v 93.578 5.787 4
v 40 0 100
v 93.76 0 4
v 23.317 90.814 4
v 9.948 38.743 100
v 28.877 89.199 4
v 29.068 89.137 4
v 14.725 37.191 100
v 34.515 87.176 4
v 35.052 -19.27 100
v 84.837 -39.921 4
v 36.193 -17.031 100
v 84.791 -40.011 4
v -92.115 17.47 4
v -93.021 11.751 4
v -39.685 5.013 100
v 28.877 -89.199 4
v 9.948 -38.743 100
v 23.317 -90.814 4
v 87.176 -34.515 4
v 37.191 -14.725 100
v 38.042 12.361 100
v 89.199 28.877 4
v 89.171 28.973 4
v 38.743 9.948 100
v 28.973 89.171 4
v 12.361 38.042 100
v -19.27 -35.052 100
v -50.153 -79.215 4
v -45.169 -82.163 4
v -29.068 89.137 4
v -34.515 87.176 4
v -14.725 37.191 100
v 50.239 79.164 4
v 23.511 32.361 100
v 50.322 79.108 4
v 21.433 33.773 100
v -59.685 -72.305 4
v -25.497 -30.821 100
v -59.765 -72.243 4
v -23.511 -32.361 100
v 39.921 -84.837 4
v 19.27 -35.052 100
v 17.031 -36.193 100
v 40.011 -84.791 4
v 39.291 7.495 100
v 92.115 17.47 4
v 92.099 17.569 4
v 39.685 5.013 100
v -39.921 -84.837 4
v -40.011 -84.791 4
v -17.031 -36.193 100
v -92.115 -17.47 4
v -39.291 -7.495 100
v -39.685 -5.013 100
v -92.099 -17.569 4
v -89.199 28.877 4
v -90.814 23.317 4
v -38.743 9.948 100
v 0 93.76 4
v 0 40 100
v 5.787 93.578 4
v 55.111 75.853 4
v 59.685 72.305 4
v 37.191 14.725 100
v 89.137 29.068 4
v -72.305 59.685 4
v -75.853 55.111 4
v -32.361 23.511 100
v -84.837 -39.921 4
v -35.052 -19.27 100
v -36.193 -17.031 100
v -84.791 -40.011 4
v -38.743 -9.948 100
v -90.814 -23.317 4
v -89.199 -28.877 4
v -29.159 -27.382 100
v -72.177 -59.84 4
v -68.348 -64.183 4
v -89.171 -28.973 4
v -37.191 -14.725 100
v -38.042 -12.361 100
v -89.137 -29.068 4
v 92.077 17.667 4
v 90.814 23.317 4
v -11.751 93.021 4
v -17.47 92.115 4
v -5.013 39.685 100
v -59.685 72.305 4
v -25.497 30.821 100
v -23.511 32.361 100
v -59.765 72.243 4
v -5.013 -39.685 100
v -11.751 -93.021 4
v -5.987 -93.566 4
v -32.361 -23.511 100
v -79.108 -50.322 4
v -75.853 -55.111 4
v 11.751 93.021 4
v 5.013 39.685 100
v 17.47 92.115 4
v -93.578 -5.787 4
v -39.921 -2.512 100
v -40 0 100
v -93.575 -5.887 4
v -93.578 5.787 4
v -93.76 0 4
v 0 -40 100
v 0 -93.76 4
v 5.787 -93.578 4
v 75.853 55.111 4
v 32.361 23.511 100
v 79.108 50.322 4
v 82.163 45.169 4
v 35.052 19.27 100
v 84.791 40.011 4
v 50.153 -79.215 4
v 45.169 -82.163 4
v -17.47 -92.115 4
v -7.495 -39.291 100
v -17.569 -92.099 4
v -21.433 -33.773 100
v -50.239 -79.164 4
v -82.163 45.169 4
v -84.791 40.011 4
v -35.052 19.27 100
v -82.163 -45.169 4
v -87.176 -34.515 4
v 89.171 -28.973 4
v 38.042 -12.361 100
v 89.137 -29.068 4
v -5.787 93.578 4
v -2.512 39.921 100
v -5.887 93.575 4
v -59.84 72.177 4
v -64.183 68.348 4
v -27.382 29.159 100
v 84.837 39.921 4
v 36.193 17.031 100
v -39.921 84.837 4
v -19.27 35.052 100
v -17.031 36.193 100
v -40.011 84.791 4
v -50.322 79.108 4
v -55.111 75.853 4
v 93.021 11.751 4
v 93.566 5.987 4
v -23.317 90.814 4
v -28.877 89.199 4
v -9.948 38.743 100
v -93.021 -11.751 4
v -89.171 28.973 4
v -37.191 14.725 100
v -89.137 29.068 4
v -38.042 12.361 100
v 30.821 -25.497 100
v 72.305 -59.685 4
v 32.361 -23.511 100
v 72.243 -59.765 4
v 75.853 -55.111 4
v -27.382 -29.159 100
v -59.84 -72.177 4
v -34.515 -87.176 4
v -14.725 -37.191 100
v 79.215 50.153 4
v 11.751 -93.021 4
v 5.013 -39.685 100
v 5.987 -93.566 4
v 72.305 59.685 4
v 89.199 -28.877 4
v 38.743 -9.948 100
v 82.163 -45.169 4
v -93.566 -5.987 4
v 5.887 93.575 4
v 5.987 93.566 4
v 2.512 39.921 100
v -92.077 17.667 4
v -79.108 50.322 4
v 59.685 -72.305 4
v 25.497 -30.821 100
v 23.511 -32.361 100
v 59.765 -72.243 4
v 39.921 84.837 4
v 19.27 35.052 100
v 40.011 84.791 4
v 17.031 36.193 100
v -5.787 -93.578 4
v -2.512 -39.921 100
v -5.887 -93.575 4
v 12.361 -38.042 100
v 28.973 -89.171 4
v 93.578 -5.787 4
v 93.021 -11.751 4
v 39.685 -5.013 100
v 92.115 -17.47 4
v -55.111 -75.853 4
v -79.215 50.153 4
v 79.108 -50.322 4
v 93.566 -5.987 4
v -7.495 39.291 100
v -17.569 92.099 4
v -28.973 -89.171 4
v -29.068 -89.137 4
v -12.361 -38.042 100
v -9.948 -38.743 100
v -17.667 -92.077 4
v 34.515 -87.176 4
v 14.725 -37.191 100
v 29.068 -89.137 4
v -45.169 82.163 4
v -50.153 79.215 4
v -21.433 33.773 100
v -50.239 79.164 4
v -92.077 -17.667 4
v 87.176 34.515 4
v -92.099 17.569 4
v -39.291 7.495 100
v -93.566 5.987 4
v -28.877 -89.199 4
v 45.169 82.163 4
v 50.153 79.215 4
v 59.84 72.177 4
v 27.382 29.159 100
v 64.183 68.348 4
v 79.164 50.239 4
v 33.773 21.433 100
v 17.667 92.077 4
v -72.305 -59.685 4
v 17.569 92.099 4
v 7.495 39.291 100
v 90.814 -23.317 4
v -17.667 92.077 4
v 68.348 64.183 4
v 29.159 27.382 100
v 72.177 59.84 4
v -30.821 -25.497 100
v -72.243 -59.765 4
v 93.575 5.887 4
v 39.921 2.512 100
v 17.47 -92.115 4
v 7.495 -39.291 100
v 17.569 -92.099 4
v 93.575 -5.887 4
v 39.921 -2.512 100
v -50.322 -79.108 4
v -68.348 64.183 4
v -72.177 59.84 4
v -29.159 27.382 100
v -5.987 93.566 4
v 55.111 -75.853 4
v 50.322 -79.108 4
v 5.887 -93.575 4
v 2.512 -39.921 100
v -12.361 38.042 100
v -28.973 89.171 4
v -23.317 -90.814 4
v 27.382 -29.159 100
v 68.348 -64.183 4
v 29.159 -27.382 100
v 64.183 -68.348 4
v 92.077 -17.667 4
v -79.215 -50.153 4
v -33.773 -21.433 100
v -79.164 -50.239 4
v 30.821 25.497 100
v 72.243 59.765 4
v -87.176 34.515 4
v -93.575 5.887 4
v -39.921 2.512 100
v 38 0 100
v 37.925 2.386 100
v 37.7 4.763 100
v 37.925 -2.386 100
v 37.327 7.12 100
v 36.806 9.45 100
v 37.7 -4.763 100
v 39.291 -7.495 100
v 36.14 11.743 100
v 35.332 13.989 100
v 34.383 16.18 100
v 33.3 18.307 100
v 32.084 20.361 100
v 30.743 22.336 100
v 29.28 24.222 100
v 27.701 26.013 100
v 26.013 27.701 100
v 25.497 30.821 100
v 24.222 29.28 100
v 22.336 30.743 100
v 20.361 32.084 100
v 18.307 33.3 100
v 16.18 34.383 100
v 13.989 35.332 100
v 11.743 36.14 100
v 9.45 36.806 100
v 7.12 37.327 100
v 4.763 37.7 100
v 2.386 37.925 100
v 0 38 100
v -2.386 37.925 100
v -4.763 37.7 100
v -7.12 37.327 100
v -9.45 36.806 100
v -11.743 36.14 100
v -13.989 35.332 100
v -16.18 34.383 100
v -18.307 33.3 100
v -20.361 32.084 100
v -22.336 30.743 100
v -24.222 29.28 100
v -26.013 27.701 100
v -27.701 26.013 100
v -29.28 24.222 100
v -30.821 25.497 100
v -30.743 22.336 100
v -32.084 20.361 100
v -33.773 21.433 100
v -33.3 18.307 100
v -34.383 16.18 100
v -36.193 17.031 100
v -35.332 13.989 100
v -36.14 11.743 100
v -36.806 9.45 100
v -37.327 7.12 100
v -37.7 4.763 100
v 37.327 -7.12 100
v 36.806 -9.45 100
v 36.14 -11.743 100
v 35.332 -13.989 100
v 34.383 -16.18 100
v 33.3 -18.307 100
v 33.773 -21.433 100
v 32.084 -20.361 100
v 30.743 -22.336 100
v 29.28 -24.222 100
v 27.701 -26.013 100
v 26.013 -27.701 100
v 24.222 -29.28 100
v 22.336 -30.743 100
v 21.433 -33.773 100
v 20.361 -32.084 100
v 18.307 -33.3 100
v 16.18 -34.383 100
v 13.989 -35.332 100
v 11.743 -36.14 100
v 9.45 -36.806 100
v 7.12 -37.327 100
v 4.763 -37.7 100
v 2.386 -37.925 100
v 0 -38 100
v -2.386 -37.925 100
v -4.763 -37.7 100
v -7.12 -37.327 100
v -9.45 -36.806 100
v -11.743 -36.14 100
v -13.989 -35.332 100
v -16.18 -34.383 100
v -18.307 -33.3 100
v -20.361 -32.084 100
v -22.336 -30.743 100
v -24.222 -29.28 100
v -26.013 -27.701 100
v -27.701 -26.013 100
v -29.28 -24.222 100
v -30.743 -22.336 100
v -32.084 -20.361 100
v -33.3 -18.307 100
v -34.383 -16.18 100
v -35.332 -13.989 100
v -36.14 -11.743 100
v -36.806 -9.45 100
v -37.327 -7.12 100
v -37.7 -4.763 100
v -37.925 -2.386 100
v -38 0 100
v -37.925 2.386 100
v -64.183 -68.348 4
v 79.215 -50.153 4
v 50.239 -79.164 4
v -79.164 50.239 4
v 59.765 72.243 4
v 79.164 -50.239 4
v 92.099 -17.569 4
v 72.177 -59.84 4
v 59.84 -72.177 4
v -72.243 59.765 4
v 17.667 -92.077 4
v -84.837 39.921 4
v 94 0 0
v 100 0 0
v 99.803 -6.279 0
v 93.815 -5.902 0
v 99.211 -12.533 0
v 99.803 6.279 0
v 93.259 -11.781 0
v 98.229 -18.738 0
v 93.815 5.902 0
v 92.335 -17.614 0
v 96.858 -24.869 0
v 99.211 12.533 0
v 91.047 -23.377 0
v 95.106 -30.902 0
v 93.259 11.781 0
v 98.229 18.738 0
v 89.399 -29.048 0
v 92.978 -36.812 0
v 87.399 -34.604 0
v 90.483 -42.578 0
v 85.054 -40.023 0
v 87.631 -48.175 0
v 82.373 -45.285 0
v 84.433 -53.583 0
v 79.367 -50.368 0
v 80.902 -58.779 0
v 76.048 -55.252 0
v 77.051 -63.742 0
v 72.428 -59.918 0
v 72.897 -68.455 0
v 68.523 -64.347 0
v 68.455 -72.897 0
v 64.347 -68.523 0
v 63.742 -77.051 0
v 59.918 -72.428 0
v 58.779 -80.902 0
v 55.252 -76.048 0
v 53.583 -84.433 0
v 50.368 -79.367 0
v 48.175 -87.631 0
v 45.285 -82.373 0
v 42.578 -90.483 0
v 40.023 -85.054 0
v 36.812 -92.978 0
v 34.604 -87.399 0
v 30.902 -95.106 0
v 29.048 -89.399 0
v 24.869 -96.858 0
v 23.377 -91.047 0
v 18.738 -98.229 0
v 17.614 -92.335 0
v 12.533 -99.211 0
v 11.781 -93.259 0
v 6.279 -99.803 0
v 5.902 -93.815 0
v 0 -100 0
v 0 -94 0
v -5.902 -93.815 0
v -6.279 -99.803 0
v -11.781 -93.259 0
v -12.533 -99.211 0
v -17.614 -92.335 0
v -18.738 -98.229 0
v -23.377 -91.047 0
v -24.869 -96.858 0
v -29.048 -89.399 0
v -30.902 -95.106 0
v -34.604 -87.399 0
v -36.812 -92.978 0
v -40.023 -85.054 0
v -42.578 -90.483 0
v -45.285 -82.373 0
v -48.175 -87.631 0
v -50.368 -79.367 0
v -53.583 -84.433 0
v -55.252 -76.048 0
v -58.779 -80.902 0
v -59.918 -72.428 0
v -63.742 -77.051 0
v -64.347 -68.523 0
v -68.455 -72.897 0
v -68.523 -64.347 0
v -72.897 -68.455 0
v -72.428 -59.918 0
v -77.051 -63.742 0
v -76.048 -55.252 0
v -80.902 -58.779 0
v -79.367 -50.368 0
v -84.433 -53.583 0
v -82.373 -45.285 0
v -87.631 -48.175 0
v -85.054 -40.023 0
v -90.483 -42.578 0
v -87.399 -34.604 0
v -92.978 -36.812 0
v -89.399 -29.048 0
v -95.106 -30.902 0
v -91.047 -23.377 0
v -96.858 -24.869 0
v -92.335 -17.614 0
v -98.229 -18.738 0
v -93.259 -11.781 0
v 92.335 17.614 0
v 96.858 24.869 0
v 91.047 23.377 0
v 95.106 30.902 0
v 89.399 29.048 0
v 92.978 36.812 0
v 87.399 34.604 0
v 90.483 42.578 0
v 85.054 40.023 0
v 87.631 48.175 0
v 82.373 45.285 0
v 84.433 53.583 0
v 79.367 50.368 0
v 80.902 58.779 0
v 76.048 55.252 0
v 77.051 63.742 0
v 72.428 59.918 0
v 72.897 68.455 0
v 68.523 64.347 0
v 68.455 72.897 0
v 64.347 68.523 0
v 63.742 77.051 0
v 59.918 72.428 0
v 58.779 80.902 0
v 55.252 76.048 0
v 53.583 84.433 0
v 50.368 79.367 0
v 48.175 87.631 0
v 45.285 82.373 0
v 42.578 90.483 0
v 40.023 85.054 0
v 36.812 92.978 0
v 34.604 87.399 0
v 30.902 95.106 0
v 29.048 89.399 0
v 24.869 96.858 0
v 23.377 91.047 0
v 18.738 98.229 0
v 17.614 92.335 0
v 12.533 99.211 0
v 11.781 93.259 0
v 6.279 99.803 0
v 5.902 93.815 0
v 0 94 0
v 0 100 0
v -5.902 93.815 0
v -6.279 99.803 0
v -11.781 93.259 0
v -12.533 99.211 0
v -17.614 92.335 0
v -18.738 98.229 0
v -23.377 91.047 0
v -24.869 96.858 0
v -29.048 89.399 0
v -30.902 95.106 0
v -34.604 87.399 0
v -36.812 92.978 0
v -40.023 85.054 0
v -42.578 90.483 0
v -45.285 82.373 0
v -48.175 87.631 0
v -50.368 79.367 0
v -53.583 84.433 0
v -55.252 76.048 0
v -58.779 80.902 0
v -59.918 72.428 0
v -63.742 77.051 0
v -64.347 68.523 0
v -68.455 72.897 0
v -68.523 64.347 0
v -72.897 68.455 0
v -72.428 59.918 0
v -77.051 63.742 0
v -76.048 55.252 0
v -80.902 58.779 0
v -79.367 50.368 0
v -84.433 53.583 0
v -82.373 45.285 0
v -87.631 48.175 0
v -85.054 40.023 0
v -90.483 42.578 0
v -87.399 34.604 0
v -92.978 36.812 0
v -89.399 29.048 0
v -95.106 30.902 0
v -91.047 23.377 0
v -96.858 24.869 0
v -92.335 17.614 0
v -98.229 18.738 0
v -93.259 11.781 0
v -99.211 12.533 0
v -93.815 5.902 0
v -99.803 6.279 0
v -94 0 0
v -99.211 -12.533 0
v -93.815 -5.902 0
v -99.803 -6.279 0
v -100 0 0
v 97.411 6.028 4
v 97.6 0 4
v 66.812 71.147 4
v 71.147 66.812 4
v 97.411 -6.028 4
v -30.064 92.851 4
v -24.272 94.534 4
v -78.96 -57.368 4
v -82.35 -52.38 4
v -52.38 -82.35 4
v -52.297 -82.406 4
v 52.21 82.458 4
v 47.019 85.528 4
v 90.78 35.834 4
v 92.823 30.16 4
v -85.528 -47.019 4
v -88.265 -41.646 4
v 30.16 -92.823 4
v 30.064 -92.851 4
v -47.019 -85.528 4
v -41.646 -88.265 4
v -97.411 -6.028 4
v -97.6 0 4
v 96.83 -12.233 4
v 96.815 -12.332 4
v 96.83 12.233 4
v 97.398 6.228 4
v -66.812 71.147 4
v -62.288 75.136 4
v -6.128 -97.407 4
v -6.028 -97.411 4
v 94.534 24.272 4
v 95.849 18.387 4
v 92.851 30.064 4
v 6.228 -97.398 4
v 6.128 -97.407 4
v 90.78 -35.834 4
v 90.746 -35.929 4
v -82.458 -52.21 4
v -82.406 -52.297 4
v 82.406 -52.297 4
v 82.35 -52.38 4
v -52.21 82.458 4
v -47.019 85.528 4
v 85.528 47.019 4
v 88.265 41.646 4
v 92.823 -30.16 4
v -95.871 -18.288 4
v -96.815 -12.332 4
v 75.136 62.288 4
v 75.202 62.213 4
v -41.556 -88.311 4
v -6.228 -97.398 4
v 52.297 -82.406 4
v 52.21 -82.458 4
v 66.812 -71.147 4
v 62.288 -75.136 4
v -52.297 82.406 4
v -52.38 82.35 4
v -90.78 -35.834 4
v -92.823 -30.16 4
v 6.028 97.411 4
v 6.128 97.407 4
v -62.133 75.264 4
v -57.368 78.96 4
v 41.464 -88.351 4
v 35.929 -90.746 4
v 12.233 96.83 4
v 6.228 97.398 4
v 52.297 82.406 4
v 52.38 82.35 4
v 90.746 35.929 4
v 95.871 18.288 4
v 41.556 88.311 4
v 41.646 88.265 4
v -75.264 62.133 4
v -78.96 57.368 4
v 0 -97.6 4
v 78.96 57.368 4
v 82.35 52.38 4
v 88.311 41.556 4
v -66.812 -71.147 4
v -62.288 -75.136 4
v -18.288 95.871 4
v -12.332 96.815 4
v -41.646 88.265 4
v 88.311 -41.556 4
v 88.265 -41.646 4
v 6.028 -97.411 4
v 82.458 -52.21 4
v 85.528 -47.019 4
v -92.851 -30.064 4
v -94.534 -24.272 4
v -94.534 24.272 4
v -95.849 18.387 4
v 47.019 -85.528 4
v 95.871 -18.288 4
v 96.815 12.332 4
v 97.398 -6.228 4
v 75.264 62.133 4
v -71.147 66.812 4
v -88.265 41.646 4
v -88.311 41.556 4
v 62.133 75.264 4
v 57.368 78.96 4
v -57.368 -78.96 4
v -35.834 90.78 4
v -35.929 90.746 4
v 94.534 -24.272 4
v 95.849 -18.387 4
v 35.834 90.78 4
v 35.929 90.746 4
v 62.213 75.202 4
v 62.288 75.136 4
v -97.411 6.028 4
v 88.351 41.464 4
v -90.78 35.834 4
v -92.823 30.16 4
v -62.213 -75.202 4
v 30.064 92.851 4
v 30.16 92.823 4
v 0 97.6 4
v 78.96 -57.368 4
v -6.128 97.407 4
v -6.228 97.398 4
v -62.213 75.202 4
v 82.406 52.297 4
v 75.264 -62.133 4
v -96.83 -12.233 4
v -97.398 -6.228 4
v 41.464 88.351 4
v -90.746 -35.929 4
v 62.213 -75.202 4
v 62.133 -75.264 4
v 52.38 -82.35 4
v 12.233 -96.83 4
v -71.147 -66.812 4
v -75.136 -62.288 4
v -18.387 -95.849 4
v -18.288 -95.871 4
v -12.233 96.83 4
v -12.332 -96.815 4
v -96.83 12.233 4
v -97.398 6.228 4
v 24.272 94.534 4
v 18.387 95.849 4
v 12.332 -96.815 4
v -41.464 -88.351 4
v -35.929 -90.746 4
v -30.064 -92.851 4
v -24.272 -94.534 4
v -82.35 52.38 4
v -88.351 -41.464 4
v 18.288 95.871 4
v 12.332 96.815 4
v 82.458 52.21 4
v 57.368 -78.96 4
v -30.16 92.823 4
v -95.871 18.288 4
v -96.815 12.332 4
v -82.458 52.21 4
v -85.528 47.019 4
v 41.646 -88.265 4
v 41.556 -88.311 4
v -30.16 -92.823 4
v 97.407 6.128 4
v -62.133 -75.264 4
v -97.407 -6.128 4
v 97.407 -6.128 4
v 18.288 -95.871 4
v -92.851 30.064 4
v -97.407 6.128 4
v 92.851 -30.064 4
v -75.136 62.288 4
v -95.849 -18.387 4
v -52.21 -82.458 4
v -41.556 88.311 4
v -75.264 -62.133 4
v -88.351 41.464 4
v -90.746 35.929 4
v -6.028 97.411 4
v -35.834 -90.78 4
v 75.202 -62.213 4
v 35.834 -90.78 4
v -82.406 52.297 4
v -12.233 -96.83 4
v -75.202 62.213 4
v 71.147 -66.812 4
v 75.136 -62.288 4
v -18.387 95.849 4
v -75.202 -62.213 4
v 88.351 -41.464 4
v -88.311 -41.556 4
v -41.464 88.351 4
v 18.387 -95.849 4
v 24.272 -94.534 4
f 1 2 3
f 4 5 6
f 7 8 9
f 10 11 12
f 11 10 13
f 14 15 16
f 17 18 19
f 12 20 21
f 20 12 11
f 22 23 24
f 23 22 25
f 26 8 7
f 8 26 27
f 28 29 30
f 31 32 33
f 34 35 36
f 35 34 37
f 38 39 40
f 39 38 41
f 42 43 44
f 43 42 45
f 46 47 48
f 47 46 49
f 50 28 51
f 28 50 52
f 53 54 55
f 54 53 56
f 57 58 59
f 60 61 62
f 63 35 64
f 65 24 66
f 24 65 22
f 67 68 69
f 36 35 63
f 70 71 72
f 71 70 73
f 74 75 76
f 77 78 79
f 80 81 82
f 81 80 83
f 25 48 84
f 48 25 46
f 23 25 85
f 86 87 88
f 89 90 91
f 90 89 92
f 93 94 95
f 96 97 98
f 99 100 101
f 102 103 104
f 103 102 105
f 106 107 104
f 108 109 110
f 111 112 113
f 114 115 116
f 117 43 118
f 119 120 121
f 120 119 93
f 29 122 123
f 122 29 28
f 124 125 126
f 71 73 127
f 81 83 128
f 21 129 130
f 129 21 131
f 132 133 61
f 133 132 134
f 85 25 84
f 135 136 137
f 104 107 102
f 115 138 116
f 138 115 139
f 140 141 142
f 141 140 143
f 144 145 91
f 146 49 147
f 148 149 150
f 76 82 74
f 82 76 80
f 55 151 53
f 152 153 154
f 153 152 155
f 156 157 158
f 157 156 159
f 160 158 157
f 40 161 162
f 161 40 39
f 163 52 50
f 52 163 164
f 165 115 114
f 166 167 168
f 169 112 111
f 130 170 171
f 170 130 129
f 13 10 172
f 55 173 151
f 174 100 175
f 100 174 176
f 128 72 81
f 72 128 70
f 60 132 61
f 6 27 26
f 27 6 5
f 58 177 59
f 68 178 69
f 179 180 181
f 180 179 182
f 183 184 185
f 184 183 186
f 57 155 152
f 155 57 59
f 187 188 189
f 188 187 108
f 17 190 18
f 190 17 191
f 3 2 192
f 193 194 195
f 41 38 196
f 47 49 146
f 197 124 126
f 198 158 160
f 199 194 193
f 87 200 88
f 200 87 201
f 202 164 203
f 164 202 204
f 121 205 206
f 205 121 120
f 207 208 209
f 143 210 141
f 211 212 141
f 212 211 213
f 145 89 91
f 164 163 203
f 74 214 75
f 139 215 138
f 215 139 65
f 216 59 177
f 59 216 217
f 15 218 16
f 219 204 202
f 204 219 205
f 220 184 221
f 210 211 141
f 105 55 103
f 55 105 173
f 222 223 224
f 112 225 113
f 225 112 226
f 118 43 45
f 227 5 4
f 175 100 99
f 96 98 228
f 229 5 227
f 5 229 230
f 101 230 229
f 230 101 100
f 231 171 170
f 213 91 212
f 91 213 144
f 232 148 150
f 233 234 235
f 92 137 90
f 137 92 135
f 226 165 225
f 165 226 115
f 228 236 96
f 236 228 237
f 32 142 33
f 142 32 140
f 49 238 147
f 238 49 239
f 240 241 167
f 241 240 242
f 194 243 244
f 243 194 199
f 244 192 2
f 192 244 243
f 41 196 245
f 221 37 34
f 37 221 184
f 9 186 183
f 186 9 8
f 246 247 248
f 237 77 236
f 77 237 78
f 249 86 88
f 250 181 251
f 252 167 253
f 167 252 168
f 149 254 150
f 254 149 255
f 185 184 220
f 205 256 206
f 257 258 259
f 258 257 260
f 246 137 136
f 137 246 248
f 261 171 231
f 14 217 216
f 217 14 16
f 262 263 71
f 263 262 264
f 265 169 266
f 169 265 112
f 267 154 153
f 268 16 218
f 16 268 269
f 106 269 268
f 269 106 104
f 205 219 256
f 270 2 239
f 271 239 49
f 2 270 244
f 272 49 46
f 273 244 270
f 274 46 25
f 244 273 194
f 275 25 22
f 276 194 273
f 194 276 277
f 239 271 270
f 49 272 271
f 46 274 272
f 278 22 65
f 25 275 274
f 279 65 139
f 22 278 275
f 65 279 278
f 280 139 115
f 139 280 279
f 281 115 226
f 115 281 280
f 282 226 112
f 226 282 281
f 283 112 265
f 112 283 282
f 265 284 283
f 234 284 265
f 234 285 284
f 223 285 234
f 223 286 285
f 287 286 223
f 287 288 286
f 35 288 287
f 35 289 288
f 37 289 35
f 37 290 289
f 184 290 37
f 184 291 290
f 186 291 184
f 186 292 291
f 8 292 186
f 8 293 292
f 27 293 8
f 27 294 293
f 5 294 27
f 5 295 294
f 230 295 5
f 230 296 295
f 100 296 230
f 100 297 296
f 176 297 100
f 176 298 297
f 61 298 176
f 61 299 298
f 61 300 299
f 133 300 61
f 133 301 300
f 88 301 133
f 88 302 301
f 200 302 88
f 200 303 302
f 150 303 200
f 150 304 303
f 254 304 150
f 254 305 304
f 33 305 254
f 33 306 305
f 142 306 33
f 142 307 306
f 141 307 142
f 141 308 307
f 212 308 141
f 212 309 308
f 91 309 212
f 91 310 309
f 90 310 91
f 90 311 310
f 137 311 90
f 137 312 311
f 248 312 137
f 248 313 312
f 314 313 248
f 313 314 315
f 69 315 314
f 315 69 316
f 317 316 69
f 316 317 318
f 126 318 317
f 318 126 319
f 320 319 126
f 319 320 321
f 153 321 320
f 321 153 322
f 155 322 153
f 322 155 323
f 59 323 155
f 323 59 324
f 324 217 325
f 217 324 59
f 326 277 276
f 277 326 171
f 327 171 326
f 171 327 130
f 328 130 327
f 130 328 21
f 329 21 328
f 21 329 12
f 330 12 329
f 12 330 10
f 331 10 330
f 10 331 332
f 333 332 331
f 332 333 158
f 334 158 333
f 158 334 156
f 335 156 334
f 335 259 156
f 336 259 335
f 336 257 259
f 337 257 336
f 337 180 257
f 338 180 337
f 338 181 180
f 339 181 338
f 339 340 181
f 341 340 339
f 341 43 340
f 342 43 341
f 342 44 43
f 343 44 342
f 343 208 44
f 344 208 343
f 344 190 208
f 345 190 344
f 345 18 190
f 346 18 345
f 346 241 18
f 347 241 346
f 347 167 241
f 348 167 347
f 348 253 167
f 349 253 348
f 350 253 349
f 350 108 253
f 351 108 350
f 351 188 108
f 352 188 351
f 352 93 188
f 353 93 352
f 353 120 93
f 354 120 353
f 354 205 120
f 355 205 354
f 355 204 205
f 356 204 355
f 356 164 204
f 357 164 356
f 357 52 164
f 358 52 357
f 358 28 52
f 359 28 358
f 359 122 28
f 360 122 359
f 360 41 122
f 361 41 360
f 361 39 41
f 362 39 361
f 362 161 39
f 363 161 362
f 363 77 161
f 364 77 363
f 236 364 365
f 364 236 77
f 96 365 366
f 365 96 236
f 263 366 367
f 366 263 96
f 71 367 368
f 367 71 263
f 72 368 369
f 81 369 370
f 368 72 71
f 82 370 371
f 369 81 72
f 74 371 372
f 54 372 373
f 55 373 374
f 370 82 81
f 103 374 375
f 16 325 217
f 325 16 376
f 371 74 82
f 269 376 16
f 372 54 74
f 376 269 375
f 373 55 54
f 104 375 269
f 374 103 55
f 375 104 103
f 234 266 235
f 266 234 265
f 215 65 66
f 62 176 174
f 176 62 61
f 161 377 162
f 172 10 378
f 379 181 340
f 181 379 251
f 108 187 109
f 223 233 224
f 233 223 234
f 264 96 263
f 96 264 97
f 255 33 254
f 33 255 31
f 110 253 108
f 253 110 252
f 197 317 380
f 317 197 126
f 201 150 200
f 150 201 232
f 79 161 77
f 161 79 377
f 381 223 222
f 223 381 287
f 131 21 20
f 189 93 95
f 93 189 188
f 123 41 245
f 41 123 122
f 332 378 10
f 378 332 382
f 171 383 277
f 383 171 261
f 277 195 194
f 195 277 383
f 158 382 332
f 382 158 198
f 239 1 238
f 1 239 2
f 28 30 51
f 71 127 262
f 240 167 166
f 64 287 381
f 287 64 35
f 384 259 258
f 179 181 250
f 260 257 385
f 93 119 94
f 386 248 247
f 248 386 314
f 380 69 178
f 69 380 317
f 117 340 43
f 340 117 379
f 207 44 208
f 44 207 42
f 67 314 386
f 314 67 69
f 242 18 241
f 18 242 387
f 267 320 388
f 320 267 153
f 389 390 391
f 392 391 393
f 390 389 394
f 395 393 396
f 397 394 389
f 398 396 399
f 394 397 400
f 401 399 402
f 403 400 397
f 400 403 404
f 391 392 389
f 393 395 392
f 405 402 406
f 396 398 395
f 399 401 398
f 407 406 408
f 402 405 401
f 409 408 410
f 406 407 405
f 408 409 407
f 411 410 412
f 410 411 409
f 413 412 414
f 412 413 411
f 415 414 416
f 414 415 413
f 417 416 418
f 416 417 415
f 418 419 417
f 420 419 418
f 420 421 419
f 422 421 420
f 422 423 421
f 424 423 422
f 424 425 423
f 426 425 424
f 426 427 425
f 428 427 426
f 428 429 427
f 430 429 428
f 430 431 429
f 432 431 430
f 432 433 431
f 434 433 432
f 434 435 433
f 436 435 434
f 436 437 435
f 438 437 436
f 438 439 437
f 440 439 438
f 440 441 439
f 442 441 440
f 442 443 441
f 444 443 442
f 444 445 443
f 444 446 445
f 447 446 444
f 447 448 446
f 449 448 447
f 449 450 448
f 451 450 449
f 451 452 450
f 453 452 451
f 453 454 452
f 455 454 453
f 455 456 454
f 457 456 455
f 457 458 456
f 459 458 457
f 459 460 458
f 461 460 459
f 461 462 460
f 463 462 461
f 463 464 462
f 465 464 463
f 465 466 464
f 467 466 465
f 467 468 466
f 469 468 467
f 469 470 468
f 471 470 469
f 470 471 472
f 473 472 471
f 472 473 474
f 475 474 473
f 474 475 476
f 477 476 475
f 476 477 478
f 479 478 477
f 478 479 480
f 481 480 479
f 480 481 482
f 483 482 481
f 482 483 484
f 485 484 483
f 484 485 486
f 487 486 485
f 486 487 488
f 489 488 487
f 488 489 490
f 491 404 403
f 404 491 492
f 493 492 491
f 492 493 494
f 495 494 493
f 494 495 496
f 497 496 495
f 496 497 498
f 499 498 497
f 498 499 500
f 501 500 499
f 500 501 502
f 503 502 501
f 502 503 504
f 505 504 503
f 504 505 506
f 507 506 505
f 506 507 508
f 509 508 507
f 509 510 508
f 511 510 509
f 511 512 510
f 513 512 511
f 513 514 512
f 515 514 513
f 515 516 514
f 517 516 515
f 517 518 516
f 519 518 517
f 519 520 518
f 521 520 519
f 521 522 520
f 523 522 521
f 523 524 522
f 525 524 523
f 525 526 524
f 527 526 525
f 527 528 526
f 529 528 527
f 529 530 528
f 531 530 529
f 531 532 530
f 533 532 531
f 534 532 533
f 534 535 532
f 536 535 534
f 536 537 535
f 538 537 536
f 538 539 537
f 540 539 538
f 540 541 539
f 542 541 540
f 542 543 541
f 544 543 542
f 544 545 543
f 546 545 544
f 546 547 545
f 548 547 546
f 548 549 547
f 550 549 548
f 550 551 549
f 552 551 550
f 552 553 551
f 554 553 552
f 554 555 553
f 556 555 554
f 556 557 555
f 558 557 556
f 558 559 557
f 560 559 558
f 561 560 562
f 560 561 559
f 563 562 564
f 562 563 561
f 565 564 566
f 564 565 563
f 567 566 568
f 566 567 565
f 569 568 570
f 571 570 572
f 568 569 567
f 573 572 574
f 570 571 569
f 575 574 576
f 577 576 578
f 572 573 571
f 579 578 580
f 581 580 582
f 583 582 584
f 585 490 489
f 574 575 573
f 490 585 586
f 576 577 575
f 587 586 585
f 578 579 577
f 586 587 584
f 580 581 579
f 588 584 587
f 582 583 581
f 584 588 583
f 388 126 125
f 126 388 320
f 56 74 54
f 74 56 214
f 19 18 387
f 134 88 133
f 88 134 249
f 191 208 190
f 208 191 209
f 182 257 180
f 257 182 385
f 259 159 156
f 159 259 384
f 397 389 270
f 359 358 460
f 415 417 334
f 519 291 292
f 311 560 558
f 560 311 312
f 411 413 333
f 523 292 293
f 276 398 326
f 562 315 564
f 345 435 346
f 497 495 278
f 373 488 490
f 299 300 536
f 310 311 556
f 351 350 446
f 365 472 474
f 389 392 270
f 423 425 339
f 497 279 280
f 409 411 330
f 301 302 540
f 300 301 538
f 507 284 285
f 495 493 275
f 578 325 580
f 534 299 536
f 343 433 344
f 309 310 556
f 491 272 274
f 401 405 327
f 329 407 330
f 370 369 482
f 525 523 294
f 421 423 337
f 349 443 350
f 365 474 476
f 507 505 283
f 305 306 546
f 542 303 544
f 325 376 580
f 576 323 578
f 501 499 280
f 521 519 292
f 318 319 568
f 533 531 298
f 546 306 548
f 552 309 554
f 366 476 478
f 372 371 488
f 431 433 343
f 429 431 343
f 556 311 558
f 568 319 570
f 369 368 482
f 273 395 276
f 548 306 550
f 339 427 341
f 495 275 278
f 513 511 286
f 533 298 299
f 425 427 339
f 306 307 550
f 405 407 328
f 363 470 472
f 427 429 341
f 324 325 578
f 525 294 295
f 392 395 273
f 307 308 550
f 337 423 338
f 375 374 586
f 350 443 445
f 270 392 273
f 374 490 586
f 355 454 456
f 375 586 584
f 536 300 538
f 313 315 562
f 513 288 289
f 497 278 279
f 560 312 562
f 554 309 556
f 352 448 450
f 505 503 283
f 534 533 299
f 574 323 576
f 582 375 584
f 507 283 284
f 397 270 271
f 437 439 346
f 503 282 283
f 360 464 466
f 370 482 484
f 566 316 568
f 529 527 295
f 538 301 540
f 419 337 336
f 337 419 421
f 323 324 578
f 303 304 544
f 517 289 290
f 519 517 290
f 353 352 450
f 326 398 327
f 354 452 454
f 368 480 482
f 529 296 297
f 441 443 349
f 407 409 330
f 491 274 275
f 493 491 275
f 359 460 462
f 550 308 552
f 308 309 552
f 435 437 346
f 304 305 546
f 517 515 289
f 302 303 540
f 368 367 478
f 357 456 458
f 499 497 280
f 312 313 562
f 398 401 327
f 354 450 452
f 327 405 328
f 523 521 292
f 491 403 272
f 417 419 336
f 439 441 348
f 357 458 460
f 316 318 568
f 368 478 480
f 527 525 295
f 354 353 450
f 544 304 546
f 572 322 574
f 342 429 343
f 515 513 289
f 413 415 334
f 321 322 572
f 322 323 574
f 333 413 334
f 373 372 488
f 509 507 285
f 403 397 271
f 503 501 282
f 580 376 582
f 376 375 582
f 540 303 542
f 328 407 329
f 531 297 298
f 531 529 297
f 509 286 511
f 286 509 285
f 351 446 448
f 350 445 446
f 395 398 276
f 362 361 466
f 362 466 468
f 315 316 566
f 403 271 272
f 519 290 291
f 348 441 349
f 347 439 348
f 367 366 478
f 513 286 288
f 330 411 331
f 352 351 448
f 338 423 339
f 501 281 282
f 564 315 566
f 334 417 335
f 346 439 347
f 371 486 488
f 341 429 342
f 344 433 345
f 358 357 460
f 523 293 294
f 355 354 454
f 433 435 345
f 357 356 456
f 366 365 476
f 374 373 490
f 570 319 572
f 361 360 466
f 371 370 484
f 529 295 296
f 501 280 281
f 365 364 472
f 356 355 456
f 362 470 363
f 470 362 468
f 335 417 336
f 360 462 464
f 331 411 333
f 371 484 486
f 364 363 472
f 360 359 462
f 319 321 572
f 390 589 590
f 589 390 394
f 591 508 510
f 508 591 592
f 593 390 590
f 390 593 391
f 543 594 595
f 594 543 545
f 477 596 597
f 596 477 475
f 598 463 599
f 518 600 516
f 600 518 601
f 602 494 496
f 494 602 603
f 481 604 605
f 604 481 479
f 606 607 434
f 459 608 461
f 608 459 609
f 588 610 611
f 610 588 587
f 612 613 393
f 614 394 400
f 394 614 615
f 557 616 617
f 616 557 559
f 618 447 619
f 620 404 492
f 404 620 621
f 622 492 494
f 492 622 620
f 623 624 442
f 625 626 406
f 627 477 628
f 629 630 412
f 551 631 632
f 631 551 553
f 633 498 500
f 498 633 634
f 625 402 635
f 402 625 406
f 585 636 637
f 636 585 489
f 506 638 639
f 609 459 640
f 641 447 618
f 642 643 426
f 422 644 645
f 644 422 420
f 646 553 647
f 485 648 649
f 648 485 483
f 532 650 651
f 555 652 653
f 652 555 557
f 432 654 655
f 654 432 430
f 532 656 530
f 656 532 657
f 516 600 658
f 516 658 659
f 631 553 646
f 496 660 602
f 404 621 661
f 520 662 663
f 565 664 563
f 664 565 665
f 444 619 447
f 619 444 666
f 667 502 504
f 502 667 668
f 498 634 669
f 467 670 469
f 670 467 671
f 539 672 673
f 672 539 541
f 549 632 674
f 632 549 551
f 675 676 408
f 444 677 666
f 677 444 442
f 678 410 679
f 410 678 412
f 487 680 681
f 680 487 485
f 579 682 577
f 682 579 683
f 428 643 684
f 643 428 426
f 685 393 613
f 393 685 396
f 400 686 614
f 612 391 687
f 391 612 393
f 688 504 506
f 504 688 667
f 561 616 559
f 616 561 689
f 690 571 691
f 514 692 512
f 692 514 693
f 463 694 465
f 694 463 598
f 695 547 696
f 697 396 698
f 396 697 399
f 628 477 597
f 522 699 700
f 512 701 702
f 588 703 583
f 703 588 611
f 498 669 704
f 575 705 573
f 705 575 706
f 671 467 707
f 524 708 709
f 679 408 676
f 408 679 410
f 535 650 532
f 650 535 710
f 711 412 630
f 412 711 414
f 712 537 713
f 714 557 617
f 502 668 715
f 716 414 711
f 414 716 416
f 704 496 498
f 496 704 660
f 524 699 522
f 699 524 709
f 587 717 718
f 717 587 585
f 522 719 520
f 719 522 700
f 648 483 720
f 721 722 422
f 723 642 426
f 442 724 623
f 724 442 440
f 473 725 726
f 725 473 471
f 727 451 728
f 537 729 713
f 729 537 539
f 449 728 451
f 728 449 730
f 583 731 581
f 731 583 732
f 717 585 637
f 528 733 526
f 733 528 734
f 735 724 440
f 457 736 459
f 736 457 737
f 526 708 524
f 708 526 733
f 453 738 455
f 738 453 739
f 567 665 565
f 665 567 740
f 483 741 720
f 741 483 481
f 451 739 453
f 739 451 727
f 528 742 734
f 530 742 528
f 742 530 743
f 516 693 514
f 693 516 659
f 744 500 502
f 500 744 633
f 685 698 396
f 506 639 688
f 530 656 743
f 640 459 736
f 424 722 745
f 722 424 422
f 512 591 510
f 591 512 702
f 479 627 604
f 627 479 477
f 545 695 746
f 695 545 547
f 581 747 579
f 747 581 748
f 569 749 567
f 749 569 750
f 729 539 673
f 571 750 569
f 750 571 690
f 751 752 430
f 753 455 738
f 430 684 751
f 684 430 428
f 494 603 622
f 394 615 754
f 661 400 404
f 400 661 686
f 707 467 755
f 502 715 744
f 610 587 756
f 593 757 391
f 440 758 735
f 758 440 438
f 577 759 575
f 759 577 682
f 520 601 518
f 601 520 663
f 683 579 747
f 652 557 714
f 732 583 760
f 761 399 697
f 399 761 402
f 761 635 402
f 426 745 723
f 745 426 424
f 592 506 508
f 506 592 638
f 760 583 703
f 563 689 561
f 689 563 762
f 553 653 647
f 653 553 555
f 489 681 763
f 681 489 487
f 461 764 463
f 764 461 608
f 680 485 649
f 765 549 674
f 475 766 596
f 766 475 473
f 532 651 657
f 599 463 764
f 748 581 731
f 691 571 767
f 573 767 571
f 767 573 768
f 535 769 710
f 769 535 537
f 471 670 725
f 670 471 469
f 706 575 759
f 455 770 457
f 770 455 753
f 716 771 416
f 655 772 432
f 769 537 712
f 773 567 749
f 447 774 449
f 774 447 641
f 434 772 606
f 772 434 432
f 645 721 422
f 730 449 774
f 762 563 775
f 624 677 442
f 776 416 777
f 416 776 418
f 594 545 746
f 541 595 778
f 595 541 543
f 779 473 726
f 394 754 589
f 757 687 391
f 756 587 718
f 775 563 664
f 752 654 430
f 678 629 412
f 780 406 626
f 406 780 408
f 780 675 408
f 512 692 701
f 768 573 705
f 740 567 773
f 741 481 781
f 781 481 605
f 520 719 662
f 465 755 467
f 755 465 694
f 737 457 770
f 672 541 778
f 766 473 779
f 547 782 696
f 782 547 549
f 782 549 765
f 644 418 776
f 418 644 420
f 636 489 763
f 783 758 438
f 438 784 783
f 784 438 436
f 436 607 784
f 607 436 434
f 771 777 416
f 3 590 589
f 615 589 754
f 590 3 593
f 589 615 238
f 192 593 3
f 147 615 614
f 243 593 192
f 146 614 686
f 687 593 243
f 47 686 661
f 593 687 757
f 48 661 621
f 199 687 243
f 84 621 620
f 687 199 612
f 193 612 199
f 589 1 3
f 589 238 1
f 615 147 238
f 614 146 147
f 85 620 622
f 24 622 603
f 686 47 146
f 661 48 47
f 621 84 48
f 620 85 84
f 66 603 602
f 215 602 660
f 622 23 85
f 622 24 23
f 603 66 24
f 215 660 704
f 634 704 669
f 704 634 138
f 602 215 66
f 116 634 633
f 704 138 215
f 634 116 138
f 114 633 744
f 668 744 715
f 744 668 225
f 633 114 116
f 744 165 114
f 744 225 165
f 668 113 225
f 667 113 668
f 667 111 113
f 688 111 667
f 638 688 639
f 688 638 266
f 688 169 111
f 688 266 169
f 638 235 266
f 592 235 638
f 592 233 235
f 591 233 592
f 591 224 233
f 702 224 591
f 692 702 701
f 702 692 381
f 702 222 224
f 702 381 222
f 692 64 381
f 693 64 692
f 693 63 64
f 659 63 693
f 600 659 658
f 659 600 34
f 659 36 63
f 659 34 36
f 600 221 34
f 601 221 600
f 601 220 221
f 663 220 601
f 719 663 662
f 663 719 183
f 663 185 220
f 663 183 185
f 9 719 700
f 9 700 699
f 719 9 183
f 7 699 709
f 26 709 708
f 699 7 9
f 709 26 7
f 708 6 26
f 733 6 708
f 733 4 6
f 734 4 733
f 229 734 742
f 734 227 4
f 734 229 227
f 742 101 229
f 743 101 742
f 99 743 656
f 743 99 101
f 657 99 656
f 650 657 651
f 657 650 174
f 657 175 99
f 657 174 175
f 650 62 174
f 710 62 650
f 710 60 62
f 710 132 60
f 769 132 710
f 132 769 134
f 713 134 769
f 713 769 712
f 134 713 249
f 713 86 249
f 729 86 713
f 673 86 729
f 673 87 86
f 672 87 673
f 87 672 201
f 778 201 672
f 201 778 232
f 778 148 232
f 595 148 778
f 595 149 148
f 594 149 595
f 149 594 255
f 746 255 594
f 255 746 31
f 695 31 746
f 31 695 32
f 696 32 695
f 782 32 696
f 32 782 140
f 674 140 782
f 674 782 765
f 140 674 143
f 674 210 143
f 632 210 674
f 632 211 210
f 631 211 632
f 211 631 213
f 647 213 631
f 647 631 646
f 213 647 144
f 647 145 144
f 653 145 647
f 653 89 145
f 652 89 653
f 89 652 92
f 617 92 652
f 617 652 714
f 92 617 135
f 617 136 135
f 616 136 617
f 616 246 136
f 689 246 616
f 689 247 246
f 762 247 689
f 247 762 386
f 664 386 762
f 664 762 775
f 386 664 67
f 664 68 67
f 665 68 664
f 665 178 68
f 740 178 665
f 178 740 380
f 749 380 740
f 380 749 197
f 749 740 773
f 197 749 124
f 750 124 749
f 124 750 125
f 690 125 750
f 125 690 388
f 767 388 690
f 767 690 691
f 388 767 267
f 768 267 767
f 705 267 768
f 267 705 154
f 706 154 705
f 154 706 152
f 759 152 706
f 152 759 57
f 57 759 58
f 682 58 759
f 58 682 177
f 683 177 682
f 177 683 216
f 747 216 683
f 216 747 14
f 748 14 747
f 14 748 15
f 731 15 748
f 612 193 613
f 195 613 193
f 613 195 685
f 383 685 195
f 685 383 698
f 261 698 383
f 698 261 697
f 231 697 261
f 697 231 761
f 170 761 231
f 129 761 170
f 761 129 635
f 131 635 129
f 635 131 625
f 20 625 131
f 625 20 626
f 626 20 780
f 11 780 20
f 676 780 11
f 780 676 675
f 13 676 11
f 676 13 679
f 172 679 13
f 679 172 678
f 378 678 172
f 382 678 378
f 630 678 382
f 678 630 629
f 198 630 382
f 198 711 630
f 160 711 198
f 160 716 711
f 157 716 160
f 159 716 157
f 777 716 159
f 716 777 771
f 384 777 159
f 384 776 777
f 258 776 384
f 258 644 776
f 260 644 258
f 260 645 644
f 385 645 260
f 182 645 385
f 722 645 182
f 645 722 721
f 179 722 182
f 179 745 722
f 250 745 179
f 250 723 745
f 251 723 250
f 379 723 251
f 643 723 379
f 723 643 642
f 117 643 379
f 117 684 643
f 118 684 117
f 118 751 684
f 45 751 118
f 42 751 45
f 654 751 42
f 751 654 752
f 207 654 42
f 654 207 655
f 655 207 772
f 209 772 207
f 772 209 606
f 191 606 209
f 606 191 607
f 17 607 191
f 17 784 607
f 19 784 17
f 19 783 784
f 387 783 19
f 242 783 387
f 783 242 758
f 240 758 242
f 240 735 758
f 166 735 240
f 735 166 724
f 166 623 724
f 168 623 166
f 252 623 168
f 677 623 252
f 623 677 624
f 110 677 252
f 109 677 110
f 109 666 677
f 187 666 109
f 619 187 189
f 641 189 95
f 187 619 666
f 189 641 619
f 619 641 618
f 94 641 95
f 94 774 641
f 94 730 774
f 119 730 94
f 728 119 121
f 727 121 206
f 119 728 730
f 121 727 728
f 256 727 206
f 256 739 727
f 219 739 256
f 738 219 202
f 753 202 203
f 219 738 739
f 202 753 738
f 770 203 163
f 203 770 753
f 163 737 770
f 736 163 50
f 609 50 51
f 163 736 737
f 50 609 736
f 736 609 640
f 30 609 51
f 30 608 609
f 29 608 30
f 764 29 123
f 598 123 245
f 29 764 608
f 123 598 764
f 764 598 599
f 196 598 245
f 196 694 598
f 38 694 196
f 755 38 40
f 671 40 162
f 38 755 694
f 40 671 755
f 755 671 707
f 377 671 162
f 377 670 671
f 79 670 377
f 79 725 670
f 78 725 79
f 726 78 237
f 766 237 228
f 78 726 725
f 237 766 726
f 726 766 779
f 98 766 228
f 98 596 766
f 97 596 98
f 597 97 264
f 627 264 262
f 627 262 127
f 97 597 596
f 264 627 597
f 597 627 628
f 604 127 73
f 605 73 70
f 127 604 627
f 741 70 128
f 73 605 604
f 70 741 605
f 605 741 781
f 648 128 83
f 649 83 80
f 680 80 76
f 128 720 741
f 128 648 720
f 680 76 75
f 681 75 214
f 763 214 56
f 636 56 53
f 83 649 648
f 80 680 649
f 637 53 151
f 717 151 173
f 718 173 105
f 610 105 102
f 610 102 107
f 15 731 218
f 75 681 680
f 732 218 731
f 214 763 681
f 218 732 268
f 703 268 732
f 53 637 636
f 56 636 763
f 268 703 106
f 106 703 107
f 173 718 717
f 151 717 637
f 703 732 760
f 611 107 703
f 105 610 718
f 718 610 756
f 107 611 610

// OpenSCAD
$fn=100;

difference() {
  cylinder(h=100, d1=200-8, d2=80);
  cylinder(h=100, d1=200-8-4, d2=80-4);
} 

difference() {
  cylinder(h=100, d1=200, d2=80);
  cylinder(h=100, d1=200-8, d2=80-4);
  translate([0,0,50+4]) cube([250,250,100], center=true);
}


 
